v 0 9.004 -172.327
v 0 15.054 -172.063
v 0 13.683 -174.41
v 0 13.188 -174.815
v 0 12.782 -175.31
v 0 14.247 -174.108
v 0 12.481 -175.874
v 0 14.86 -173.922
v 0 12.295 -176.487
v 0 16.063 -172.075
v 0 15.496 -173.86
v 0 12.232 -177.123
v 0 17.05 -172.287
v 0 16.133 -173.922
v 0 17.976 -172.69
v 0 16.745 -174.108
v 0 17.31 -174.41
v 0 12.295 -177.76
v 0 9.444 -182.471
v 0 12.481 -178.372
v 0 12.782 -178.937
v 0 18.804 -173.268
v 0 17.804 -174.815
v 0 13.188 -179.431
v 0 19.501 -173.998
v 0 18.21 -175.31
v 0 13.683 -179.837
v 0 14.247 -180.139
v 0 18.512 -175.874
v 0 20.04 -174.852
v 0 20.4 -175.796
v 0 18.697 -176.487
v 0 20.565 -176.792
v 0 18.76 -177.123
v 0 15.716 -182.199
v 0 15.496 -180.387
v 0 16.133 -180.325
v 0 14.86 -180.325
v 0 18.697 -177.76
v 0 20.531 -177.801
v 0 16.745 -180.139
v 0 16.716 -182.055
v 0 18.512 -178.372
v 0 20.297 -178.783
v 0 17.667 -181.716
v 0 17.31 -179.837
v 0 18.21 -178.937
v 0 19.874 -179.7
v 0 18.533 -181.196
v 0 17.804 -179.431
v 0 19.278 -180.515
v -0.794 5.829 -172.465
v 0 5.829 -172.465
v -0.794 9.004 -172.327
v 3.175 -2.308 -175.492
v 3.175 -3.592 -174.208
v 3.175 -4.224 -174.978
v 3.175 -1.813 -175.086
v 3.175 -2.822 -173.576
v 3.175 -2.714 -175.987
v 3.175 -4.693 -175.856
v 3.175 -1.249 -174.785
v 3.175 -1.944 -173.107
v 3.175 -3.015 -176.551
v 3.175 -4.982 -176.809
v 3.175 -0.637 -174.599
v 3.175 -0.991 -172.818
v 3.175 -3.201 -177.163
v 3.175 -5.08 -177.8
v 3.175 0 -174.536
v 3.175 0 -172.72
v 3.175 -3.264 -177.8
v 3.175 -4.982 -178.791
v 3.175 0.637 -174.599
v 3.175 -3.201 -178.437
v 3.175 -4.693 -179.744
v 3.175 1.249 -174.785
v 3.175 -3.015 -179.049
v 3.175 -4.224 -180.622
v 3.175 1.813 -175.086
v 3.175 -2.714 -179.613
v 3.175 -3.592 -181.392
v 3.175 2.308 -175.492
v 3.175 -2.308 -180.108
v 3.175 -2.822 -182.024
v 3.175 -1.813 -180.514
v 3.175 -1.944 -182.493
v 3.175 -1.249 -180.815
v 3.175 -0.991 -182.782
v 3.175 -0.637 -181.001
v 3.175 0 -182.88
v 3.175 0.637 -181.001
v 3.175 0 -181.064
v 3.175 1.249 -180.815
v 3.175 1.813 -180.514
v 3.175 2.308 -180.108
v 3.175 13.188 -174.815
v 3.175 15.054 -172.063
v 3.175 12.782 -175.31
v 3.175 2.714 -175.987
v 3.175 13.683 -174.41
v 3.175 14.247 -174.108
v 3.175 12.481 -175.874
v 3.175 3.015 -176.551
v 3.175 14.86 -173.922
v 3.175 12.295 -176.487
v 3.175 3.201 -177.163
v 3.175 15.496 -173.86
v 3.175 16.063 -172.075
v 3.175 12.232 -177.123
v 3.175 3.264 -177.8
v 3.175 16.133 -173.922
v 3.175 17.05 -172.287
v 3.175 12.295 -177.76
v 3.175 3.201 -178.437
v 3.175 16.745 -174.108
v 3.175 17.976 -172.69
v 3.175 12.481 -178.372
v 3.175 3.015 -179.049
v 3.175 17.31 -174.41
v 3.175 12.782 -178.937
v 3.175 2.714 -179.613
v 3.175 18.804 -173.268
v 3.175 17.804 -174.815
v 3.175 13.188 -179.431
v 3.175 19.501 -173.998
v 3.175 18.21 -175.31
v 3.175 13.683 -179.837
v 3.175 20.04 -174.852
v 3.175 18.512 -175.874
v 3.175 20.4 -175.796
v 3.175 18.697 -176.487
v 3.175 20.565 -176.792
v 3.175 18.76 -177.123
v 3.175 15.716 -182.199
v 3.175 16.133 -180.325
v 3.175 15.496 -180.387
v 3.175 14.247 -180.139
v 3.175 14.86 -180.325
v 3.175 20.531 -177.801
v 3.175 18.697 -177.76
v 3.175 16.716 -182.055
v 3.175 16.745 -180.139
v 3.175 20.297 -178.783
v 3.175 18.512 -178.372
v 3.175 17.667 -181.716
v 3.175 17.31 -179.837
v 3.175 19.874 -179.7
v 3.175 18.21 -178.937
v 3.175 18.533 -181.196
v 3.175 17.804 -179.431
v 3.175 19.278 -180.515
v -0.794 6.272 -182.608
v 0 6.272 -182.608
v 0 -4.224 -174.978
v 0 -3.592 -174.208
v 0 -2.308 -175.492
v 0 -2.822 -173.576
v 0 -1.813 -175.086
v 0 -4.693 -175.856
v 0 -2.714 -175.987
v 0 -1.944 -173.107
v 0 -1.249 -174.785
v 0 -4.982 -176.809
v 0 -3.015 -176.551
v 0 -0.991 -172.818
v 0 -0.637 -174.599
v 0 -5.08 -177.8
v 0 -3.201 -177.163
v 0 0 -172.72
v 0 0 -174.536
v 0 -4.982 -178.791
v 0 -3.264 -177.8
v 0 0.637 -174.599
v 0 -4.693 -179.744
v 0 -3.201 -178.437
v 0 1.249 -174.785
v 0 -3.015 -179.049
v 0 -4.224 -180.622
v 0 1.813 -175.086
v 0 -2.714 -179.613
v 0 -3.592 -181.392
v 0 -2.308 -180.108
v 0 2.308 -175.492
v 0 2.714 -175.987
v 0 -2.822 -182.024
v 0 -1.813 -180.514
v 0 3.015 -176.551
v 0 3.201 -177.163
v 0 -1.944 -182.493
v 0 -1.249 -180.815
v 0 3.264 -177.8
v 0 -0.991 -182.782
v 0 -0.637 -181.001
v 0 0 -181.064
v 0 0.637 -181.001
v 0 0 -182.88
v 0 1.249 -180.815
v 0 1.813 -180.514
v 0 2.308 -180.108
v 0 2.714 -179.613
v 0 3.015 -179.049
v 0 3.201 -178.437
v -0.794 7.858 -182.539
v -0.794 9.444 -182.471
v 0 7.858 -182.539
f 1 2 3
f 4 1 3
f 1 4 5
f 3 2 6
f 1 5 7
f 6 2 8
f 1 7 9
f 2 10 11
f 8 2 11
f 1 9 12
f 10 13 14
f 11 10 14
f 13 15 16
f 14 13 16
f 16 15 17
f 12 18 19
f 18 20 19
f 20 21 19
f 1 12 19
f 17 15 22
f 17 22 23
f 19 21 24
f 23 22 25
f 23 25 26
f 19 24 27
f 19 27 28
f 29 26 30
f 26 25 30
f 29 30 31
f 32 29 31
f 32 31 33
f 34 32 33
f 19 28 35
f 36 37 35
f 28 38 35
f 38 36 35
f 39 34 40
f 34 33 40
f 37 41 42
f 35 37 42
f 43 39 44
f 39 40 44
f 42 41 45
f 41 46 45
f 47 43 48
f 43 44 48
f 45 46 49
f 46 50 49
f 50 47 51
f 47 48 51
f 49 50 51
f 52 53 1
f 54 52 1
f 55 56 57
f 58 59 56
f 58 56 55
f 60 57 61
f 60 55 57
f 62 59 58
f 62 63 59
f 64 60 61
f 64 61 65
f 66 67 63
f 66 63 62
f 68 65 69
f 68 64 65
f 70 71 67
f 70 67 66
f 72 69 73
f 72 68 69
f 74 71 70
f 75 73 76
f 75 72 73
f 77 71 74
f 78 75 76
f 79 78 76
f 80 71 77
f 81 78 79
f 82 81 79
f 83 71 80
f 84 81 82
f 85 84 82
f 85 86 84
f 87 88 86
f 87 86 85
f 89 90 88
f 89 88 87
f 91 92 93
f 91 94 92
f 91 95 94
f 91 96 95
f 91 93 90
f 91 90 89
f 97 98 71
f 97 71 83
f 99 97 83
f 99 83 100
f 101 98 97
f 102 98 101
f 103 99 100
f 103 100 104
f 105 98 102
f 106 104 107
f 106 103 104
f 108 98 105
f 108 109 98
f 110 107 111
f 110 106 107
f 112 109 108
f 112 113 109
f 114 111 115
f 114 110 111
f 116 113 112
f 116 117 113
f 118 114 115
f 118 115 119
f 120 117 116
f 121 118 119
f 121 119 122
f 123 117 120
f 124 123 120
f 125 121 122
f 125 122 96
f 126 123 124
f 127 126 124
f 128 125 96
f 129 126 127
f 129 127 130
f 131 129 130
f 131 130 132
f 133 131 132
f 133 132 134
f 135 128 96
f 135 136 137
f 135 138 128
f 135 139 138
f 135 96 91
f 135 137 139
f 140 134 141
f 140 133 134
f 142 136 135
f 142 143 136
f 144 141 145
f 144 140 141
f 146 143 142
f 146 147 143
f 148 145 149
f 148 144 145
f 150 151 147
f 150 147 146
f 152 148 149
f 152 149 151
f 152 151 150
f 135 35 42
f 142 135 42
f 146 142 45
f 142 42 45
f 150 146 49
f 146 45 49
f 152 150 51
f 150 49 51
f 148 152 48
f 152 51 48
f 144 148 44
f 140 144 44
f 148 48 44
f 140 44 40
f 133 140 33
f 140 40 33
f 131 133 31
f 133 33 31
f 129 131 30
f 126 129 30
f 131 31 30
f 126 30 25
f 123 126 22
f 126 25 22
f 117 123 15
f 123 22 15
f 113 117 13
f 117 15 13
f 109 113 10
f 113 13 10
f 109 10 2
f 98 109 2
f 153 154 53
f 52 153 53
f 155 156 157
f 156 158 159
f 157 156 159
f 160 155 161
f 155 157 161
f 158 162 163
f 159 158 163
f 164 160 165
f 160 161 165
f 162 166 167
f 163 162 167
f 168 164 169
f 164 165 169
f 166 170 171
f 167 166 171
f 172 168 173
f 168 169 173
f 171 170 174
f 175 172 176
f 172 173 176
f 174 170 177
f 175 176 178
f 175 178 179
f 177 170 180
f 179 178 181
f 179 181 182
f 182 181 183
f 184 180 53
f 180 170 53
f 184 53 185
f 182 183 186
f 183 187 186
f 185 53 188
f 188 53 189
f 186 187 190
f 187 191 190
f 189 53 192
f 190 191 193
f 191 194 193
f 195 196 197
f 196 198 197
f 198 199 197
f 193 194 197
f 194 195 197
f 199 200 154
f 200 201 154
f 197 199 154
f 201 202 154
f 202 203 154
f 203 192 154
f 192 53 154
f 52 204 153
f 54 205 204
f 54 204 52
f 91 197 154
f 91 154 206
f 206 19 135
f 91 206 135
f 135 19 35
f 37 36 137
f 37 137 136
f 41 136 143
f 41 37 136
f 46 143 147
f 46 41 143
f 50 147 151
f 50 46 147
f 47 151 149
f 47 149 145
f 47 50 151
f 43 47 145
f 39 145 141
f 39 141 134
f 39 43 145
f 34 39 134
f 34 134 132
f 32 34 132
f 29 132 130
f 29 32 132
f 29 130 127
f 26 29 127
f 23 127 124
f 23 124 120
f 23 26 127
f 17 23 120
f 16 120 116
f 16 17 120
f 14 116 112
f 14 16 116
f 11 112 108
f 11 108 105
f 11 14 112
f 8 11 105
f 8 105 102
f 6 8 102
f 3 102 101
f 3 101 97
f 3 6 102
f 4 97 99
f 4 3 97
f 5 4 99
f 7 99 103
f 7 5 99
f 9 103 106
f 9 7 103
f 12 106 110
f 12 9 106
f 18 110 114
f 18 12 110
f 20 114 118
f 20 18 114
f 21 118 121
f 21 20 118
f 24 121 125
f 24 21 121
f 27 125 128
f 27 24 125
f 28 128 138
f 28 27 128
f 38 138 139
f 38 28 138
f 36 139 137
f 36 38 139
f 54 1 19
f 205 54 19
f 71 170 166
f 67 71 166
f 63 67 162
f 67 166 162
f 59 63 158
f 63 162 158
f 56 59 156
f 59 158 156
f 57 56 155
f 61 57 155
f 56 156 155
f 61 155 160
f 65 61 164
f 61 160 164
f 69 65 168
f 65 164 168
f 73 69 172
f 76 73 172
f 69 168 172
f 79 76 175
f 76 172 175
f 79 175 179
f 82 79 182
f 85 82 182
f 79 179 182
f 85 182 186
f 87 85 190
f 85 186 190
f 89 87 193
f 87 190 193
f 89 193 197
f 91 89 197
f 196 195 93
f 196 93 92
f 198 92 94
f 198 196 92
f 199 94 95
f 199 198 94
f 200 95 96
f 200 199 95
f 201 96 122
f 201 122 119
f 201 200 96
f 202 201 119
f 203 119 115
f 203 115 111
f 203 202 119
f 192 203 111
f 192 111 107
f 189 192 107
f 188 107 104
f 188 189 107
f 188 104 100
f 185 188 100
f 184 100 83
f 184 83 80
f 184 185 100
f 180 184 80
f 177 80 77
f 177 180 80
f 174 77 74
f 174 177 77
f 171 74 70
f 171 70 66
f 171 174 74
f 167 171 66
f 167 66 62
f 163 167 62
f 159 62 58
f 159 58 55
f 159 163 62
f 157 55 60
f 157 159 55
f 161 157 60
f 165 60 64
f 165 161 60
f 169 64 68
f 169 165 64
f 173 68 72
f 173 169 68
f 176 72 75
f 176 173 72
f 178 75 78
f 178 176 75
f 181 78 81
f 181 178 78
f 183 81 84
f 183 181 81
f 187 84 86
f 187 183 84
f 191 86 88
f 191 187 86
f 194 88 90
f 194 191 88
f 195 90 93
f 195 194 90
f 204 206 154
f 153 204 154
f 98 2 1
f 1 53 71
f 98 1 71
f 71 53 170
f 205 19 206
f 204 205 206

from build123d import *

# Parameters (mm, degrees)
SKETCH1_R           = 3.2639
BOSS_EXTRUDE1_DEPTH = 3.175
BOSS_EXTRUDE2_DEPTH = 0.79375


with BuildPart() as part:
    # Sketch1 → Boss-Extrude1 (new body)
    with BuildSketch(Plane(origin=(0, 0, 0), x_dir=(0, 0, -1), z_dir=(1, 0, 0))):
        with BuildLine():
            Line((172.062748254, 15.053539887), (172.72, 0))
            ThreePointArc((172.72, 0), (177.8, -5.08), (182.88, 0))
            Line((182.88, 0), (182.198650149, 15.716317735))
            ThreePointArc((182.198650149, 15.716317735), (176.791948401, 20.565465387), (172.062748254, 15.053539887))
        make_face()
        with Locations((177.8, 0)):
            Circle(SKETCH1_R, mode=Mode.SUBTRACT)
        with Locations((177.123417321, 15.496291061)):
            Circle(SKETCH1_R, mode=Mode.SUBTRACT)
    extrude(amount=BOSS_EXTRUDE1_DEPTH)

    # Sketch2 → Boss-Extrude2 (add)
    with BuildSketch(Plane.ZY):
        Polygon((-182.539325075, 7.858158868), (-182.60808341, 6.272148609), (-172.465486686, 5.829313272), (-172.326859023, 9.004408754), (-182.470566739, 9.444169127), align=None)
    extrude(amount=BOSS_EXTRUDE2_DEPTH)


solid = part.part
